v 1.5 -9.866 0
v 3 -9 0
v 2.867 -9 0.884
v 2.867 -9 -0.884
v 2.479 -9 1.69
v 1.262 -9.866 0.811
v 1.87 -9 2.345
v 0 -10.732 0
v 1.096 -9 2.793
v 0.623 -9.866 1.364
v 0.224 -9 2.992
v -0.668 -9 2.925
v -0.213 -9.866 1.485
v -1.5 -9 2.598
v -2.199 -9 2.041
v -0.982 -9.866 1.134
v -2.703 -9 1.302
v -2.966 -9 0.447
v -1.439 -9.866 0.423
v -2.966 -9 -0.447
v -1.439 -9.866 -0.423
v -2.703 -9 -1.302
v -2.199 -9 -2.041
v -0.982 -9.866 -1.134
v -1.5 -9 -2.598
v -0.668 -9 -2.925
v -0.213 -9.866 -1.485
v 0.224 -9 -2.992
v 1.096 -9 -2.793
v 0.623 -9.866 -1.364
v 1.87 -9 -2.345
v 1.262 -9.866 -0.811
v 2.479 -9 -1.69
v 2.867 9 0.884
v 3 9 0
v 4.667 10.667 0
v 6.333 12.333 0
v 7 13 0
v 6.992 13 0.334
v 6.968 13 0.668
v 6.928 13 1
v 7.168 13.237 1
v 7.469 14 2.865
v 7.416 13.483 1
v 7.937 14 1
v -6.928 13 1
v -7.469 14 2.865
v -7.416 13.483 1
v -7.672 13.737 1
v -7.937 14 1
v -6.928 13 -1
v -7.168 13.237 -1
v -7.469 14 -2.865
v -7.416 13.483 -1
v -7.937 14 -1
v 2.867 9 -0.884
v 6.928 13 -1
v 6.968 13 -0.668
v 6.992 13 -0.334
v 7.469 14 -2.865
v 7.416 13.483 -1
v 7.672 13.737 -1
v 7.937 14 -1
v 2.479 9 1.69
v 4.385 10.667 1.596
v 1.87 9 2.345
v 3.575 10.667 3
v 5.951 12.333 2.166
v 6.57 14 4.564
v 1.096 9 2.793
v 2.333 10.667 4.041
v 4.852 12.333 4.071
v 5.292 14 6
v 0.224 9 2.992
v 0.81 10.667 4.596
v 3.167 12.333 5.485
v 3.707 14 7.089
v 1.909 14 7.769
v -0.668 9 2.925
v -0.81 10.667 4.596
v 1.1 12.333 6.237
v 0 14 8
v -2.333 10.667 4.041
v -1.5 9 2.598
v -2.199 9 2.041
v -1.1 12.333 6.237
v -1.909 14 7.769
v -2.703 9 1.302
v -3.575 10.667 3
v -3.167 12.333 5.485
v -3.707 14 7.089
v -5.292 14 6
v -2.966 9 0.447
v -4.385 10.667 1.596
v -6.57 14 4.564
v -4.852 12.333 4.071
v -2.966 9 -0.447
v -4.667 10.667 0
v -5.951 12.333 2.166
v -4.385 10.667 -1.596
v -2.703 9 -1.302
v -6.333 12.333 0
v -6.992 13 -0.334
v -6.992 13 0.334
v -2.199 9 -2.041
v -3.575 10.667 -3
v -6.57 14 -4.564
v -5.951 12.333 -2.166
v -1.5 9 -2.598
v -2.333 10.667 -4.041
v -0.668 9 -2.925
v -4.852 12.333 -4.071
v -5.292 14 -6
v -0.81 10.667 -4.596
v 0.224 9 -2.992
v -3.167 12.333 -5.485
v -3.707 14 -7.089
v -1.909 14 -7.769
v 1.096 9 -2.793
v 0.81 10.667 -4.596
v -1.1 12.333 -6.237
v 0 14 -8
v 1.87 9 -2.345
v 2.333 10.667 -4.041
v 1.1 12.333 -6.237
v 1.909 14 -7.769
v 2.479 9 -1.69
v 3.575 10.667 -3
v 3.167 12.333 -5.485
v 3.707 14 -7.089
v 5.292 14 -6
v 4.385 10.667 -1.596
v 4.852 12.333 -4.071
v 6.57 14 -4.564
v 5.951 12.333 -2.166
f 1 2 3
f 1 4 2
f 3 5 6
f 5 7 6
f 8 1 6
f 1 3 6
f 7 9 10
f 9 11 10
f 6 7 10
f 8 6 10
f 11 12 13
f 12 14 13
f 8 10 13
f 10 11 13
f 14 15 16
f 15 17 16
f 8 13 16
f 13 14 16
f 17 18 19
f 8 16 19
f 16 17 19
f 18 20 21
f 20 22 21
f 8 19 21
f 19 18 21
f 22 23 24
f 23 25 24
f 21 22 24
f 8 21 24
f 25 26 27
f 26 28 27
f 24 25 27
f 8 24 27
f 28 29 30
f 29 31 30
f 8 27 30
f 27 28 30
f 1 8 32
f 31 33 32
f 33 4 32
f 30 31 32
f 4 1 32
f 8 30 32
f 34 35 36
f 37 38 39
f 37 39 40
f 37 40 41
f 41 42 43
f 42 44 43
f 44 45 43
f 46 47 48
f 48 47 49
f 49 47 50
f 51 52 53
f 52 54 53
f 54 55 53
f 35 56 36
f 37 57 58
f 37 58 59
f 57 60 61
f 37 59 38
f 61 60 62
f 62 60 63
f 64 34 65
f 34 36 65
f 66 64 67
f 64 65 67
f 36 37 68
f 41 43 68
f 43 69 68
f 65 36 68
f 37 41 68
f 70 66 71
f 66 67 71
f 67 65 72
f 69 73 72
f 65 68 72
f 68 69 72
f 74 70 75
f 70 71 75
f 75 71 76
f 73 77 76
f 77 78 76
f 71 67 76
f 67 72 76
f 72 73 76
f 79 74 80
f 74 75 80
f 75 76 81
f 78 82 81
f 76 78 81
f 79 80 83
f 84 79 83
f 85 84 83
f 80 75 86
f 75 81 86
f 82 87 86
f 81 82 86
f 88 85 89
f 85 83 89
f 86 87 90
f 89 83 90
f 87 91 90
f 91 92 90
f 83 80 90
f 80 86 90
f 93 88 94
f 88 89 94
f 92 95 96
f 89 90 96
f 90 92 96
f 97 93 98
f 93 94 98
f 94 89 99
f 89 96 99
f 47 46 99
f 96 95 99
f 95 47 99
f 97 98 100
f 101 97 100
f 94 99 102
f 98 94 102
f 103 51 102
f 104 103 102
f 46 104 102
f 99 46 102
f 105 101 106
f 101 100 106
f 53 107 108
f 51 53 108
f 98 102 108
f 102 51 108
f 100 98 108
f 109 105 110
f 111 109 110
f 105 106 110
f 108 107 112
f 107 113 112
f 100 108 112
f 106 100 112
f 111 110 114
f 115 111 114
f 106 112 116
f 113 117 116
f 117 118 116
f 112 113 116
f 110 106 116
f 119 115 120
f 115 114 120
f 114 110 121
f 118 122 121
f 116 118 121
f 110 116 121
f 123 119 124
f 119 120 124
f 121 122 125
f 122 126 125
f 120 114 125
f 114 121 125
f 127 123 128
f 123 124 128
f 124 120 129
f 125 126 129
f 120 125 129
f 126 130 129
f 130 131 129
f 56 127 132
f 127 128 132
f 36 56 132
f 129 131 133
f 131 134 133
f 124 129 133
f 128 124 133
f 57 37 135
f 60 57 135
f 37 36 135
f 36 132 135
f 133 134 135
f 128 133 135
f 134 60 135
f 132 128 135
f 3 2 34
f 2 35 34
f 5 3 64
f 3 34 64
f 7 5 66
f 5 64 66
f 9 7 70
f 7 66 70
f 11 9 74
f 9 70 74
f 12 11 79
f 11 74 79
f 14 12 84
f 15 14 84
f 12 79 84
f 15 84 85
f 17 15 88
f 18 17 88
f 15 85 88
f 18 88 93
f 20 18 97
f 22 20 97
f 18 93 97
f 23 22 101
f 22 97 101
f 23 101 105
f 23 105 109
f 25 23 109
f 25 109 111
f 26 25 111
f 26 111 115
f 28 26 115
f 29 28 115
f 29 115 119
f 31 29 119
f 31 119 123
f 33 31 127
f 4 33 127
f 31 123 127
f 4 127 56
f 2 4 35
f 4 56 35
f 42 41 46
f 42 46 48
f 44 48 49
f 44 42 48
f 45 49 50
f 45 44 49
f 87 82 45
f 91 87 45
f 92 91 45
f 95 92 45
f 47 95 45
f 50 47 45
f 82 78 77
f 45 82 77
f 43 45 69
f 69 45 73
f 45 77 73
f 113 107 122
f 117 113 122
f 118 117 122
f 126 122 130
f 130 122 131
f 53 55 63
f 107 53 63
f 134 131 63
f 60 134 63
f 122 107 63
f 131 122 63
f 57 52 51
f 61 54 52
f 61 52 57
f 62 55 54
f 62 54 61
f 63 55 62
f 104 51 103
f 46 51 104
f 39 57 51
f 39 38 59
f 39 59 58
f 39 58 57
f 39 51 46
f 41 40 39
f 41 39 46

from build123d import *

# Parameters (mm, degrees)
CUT_EXTRUDE1_DEPTH = 9


with BuildPart() as part:
    # Sketch1 → Revolve1 (revolve)
    with BuildSketch(Plane.XY):
        Polygon((0, 9), (0, -9), (0, -10.732050808), (3, -9), (3, 9), (8, 14), (0, 14), align=None)
    revolve(axis=Axis((0, 9, 0), (0, -1, 0)))

    # Sketch2 → Cut-Extrude1 (cut, symmetric)
    with BuildSketch(Plane(origin=(0, 0, 0), x_dir=(0, 0, -1), z_dir=(1, 0, 0))):
        Polygon((0, 14), (1, 14), (1, 13), (-1, 13), (-1, 14), align=None)
    extrude(amount=CUT_EXTRUDE1_DEPTH, both=True, mode=Mode.SUBTRACT)


solid = part.part
